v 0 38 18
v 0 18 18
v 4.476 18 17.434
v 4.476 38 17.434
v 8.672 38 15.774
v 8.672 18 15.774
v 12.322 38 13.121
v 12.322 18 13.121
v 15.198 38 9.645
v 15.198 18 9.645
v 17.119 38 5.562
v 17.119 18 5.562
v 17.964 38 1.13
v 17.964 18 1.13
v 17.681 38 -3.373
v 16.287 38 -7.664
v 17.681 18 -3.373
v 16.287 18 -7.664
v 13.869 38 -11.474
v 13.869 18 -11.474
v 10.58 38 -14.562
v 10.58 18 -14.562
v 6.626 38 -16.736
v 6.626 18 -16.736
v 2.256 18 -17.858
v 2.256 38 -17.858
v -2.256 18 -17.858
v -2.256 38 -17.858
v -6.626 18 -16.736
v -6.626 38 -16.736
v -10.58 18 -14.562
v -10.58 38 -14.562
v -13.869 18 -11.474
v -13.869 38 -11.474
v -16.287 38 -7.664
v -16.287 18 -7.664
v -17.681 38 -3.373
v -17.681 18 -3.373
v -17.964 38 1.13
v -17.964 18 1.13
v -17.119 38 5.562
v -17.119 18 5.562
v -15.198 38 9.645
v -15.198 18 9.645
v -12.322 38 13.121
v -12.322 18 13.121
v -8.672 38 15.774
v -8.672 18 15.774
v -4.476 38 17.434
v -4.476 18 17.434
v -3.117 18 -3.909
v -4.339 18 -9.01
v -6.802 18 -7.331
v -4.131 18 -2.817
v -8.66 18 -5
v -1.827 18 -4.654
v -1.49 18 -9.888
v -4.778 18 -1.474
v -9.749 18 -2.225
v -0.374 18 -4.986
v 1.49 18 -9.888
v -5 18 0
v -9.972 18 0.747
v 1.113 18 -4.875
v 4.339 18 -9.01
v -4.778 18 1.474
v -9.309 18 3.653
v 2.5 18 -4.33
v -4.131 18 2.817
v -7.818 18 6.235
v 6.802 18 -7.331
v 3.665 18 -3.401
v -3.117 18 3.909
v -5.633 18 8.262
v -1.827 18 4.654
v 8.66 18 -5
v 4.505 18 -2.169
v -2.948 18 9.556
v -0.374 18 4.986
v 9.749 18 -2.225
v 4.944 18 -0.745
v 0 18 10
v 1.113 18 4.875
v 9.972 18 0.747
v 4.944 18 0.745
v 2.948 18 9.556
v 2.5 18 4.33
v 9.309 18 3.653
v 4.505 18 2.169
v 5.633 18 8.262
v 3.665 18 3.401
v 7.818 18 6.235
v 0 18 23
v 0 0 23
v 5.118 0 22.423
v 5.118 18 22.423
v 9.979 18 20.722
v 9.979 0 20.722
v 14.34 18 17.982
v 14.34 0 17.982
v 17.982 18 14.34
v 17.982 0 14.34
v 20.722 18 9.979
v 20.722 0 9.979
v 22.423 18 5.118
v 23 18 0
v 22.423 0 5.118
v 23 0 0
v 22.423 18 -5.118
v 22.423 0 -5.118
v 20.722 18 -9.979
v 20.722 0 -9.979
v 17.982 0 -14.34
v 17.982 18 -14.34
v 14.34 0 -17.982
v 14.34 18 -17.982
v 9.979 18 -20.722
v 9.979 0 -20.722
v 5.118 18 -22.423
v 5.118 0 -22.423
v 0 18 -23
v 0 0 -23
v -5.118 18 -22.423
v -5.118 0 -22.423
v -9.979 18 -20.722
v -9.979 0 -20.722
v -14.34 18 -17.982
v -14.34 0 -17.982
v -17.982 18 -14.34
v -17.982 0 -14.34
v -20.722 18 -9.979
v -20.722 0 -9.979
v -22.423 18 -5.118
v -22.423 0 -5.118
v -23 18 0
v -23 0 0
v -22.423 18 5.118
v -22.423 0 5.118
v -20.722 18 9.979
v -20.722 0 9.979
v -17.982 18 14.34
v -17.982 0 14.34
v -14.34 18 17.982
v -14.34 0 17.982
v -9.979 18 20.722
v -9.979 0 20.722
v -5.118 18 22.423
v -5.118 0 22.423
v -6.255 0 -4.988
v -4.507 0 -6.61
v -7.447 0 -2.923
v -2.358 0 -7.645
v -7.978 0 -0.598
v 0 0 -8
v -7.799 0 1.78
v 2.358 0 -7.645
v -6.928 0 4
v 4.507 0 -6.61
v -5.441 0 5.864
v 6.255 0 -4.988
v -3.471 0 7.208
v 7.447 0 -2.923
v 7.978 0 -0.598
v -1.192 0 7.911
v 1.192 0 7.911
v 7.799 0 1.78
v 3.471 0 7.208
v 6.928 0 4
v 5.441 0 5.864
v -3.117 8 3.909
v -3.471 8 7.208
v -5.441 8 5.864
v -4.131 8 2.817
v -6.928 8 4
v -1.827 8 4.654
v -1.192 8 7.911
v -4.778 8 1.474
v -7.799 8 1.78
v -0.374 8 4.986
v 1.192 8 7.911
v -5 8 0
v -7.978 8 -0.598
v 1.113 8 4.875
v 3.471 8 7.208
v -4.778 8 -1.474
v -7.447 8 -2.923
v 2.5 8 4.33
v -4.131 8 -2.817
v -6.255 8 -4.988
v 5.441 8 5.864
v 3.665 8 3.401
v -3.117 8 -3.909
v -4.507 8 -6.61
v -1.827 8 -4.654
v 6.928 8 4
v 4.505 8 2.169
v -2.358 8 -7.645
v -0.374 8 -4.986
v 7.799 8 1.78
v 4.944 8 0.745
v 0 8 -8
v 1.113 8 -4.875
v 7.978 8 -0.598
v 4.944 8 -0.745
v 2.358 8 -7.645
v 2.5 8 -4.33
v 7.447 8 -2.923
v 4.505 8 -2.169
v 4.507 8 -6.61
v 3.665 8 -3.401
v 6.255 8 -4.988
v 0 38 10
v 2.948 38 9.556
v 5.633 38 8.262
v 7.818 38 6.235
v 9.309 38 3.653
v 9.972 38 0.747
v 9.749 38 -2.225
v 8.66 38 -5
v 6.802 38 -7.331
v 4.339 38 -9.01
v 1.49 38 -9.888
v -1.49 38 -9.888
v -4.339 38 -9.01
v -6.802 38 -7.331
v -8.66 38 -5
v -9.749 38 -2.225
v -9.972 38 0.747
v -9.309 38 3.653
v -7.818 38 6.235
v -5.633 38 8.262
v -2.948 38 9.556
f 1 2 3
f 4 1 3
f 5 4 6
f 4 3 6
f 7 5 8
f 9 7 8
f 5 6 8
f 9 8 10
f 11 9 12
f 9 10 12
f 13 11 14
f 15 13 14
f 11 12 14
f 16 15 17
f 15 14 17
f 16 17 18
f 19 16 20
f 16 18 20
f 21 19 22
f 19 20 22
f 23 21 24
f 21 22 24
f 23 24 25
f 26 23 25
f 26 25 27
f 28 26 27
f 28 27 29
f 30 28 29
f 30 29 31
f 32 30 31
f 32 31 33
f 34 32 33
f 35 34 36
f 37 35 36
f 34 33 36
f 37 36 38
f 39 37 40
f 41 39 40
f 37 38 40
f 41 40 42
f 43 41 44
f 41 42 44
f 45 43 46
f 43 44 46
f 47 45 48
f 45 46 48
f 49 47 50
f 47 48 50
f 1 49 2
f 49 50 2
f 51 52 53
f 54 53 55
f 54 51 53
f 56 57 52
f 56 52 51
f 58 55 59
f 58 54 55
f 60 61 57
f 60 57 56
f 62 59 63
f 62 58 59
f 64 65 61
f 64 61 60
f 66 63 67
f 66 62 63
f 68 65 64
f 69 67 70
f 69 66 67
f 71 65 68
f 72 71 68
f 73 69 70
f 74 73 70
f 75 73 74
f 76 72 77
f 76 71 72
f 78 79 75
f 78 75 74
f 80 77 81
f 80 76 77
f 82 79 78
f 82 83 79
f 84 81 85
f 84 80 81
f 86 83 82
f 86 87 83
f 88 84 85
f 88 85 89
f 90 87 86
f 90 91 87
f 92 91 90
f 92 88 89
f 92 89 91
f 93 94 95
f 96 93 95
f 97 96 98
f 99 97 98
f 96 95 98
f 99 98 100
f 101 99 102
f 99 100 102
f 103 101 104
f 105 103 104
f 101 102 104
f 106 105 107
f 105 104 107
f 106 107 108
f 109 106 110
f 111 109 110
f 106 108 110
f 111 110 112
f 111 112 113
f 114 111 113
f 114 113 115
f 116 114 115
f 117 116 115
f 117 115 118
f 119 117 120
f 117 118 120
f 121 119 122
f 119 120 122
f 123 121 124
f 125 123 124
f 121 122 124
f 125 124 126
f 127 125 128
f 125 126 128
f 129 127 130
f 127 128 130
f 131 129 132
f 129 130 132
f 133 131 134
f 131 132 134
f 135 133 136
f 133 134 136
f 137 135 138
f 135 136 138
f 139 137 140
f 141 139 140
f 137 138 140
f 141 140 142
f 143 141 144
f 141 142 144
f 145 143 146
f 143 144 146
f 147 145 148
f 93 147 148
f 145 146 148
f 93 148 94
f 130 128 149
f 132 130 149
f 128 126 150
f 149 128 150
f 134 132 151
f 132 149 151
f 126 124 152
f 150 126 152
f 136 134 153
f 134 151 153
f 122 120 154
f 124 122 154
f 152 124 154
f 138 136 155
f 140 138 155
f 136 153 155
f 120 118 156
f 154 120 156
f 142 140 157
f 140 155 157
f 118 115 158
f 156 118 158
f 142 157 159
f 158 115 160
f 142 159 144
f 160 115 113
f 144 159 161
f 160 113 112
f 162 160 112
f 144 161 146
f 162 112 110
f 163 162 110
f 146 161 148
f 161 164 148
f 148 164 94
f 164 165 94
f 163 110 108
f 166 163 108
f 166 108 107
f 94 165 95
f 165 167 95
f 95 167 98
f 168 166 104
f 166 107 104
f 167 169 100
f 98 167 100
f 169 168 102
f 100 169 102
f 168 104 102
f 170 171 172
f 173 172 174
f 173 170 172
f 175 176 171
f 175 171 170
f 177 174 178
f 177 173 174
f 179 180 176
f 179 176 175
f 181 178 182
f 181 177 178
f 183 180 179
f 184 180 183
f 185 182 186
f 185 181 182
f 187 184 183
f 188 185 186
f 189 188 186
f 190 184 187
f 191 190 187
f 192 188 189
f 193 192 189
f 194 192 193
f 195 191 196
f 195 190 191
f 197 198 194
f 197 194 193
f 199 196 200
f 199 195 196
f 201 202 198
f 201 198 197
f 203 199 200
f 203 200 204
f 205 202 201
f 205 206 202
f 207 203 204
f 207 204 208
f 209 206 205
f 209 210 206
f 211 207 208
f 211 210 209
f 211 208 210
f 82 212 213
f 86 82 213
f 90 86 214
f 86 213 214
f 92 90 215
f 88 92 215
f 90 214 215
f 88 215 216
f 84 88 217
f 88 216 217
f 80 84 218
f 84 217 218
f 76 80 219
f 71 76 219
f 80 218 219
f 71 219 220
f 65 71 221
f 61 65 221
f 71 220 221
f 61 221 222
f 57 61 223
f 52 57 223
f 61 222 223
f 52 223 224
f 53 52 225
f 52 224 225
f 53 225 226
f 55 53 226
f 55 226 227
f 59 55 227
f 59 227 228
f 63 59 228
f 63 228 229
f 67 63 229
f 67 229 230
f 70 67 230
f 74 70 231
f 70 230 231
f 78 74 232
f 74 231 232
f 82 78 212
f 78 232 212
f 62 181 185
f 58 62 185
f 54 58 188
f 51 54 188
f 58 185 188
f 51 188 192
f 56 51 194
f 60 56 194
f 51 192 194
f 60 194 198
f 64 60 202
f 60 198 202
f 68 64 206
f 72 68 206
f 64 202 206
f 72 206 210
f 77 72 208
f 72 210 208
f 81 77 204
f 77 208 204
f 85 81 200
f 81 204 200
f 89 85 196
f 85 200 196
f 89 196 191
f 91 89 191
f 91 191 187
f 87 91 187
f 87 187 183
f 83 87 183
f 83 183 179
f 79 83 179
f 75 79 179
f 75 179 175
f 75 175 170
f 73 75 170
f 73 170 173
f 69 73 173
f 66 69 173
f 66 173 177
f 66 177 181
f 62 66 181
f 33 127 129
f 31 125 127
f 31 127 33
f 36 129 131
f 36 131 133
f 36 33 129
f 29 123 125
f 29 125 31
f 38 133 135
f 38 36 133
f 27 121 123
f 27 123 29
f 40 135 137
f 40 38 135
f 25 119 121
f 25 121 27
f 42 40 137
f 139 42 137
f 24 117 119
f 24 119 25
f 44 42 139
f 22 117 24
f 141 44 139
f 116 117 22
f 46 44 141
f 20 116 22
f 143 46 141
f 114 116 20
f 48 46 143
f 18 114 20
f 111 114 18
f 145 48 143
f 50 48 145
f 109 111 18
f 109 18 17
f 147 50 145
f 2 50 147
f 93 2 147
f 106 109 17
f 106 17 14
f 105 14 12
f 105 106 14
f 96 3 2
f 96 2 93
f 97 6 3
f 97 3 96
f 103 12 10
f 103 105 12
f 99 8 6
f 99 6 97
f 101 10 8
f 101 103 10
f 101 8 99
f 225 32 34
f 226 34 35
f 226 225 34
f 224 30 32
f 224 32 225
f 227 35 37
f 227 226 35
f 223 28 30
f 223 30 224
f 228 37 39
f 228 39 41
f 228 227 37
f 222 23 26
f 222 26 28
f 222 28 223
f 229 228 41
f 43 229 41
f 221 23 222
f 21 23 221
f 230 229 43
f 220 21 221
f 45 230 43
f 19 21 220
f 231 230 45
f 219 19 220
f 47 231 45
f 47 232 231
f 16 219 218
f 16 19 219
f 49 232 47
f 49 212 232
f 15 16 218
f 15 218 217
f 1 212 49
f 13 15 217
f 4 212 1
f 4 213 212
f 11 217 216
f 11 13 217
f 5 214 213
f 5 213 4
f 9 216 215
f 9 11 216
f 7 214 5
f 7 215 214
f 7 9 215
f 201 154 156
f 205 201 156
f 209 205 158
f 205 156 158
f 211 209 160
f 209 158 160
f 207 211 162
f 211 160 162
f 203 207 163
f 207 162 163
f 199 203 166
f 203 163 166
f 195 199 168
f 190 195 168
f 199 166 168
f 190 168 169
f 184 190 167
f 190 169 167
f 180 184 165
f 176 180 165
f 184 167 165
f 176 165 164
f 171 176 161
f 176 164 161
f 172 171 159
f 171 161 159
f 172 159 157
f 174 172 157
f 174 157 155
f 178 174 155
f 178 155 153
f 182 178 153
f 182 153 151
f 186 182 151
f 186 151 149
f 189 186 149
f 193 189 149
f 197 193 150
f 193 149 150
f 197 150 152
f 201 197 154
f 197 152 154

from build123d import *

# Parameters (mm, degrees)
SKETCH1_R              = 23
BOSS_EXTRUDE1_DEPTH    = 18
SKETCH2_R              = 18
BOSS_EXTRUDE2_DEPTH    = 20
SKETCH3_R              = 8
CUT_EXTRUDE1_DEPTH     = 8
SKETCH4_R              = 10
CUT_EXTRUDE2_DEPTH     = 20
F_10_0MM_DOWEL_SLOT1_D = 10


with BuildPart() as part:
    # Sketch1 → Boss-Extrude1 (new body)
    with BuildSketch(Plane(origin=(0, 0, 0), x_dir=(1, 0, 0), z_dir=(0, 1, 0))):
        with Locations(Location((0, 0, 0), (0, 0, 270))):
            Circle(SKETCH1_R)
    extrude(amount=BOSS_EXTRUDE1_DEPTH)

    # Sketch2 → Boss-Extrude2 (add)
    with BuildSketch(Plane(origin=(0, 18, 0), x_dir=(1, 0, 0), z_dir=(0, 1, 0))):
        with Locations(Location((0, 0, 0), (0, 0, 270))):
            Circle(SKETCH2_R)
    extrude(amount=BOSS_EXTRUDE2_DEPTH)

    # Sketch3 → Cut-Extrude1 (cut)
    with BuildSketch(Plane(origin=(0, 0, 0), x_dir=(-1, 0, 0), z_dir=(0, -1, 0))):
        with Locations(Location((0, 0, 0), (0, 0, 90))):
            Circle(SKETCH3_R)
    extrude(amount=-CUT_EXTRUDE1_DEPTH, mode=Mode.SUBTRACT)

    # Sketch4 → Cut-Extrude2 (cut)
    with BuildSketch(Plane(origin=(0, 38, 0), x_dir=(1, 0, 0), z_dir=(0, 1, 0))):
        with Locations(Location((0, 0, 0), (0, 0, 270))):
            Circle(SKETCH4_R)
    extrude(amount=-CUT_EXTRUDE2_DEPTH, mode=Mode.SUBTRACT)

    # Ø10.0mm Dowel Slot1 (through all)
    with Locations(Plane(origin=(0, 18, 0), x_dir=(1, 0, 0), z_dir=(0, 1, 0))):
        with Locations((0, 0)):
            Hole(F_10_0MM_DOWEL_SLOT1_D / 2)


solid = part.part
